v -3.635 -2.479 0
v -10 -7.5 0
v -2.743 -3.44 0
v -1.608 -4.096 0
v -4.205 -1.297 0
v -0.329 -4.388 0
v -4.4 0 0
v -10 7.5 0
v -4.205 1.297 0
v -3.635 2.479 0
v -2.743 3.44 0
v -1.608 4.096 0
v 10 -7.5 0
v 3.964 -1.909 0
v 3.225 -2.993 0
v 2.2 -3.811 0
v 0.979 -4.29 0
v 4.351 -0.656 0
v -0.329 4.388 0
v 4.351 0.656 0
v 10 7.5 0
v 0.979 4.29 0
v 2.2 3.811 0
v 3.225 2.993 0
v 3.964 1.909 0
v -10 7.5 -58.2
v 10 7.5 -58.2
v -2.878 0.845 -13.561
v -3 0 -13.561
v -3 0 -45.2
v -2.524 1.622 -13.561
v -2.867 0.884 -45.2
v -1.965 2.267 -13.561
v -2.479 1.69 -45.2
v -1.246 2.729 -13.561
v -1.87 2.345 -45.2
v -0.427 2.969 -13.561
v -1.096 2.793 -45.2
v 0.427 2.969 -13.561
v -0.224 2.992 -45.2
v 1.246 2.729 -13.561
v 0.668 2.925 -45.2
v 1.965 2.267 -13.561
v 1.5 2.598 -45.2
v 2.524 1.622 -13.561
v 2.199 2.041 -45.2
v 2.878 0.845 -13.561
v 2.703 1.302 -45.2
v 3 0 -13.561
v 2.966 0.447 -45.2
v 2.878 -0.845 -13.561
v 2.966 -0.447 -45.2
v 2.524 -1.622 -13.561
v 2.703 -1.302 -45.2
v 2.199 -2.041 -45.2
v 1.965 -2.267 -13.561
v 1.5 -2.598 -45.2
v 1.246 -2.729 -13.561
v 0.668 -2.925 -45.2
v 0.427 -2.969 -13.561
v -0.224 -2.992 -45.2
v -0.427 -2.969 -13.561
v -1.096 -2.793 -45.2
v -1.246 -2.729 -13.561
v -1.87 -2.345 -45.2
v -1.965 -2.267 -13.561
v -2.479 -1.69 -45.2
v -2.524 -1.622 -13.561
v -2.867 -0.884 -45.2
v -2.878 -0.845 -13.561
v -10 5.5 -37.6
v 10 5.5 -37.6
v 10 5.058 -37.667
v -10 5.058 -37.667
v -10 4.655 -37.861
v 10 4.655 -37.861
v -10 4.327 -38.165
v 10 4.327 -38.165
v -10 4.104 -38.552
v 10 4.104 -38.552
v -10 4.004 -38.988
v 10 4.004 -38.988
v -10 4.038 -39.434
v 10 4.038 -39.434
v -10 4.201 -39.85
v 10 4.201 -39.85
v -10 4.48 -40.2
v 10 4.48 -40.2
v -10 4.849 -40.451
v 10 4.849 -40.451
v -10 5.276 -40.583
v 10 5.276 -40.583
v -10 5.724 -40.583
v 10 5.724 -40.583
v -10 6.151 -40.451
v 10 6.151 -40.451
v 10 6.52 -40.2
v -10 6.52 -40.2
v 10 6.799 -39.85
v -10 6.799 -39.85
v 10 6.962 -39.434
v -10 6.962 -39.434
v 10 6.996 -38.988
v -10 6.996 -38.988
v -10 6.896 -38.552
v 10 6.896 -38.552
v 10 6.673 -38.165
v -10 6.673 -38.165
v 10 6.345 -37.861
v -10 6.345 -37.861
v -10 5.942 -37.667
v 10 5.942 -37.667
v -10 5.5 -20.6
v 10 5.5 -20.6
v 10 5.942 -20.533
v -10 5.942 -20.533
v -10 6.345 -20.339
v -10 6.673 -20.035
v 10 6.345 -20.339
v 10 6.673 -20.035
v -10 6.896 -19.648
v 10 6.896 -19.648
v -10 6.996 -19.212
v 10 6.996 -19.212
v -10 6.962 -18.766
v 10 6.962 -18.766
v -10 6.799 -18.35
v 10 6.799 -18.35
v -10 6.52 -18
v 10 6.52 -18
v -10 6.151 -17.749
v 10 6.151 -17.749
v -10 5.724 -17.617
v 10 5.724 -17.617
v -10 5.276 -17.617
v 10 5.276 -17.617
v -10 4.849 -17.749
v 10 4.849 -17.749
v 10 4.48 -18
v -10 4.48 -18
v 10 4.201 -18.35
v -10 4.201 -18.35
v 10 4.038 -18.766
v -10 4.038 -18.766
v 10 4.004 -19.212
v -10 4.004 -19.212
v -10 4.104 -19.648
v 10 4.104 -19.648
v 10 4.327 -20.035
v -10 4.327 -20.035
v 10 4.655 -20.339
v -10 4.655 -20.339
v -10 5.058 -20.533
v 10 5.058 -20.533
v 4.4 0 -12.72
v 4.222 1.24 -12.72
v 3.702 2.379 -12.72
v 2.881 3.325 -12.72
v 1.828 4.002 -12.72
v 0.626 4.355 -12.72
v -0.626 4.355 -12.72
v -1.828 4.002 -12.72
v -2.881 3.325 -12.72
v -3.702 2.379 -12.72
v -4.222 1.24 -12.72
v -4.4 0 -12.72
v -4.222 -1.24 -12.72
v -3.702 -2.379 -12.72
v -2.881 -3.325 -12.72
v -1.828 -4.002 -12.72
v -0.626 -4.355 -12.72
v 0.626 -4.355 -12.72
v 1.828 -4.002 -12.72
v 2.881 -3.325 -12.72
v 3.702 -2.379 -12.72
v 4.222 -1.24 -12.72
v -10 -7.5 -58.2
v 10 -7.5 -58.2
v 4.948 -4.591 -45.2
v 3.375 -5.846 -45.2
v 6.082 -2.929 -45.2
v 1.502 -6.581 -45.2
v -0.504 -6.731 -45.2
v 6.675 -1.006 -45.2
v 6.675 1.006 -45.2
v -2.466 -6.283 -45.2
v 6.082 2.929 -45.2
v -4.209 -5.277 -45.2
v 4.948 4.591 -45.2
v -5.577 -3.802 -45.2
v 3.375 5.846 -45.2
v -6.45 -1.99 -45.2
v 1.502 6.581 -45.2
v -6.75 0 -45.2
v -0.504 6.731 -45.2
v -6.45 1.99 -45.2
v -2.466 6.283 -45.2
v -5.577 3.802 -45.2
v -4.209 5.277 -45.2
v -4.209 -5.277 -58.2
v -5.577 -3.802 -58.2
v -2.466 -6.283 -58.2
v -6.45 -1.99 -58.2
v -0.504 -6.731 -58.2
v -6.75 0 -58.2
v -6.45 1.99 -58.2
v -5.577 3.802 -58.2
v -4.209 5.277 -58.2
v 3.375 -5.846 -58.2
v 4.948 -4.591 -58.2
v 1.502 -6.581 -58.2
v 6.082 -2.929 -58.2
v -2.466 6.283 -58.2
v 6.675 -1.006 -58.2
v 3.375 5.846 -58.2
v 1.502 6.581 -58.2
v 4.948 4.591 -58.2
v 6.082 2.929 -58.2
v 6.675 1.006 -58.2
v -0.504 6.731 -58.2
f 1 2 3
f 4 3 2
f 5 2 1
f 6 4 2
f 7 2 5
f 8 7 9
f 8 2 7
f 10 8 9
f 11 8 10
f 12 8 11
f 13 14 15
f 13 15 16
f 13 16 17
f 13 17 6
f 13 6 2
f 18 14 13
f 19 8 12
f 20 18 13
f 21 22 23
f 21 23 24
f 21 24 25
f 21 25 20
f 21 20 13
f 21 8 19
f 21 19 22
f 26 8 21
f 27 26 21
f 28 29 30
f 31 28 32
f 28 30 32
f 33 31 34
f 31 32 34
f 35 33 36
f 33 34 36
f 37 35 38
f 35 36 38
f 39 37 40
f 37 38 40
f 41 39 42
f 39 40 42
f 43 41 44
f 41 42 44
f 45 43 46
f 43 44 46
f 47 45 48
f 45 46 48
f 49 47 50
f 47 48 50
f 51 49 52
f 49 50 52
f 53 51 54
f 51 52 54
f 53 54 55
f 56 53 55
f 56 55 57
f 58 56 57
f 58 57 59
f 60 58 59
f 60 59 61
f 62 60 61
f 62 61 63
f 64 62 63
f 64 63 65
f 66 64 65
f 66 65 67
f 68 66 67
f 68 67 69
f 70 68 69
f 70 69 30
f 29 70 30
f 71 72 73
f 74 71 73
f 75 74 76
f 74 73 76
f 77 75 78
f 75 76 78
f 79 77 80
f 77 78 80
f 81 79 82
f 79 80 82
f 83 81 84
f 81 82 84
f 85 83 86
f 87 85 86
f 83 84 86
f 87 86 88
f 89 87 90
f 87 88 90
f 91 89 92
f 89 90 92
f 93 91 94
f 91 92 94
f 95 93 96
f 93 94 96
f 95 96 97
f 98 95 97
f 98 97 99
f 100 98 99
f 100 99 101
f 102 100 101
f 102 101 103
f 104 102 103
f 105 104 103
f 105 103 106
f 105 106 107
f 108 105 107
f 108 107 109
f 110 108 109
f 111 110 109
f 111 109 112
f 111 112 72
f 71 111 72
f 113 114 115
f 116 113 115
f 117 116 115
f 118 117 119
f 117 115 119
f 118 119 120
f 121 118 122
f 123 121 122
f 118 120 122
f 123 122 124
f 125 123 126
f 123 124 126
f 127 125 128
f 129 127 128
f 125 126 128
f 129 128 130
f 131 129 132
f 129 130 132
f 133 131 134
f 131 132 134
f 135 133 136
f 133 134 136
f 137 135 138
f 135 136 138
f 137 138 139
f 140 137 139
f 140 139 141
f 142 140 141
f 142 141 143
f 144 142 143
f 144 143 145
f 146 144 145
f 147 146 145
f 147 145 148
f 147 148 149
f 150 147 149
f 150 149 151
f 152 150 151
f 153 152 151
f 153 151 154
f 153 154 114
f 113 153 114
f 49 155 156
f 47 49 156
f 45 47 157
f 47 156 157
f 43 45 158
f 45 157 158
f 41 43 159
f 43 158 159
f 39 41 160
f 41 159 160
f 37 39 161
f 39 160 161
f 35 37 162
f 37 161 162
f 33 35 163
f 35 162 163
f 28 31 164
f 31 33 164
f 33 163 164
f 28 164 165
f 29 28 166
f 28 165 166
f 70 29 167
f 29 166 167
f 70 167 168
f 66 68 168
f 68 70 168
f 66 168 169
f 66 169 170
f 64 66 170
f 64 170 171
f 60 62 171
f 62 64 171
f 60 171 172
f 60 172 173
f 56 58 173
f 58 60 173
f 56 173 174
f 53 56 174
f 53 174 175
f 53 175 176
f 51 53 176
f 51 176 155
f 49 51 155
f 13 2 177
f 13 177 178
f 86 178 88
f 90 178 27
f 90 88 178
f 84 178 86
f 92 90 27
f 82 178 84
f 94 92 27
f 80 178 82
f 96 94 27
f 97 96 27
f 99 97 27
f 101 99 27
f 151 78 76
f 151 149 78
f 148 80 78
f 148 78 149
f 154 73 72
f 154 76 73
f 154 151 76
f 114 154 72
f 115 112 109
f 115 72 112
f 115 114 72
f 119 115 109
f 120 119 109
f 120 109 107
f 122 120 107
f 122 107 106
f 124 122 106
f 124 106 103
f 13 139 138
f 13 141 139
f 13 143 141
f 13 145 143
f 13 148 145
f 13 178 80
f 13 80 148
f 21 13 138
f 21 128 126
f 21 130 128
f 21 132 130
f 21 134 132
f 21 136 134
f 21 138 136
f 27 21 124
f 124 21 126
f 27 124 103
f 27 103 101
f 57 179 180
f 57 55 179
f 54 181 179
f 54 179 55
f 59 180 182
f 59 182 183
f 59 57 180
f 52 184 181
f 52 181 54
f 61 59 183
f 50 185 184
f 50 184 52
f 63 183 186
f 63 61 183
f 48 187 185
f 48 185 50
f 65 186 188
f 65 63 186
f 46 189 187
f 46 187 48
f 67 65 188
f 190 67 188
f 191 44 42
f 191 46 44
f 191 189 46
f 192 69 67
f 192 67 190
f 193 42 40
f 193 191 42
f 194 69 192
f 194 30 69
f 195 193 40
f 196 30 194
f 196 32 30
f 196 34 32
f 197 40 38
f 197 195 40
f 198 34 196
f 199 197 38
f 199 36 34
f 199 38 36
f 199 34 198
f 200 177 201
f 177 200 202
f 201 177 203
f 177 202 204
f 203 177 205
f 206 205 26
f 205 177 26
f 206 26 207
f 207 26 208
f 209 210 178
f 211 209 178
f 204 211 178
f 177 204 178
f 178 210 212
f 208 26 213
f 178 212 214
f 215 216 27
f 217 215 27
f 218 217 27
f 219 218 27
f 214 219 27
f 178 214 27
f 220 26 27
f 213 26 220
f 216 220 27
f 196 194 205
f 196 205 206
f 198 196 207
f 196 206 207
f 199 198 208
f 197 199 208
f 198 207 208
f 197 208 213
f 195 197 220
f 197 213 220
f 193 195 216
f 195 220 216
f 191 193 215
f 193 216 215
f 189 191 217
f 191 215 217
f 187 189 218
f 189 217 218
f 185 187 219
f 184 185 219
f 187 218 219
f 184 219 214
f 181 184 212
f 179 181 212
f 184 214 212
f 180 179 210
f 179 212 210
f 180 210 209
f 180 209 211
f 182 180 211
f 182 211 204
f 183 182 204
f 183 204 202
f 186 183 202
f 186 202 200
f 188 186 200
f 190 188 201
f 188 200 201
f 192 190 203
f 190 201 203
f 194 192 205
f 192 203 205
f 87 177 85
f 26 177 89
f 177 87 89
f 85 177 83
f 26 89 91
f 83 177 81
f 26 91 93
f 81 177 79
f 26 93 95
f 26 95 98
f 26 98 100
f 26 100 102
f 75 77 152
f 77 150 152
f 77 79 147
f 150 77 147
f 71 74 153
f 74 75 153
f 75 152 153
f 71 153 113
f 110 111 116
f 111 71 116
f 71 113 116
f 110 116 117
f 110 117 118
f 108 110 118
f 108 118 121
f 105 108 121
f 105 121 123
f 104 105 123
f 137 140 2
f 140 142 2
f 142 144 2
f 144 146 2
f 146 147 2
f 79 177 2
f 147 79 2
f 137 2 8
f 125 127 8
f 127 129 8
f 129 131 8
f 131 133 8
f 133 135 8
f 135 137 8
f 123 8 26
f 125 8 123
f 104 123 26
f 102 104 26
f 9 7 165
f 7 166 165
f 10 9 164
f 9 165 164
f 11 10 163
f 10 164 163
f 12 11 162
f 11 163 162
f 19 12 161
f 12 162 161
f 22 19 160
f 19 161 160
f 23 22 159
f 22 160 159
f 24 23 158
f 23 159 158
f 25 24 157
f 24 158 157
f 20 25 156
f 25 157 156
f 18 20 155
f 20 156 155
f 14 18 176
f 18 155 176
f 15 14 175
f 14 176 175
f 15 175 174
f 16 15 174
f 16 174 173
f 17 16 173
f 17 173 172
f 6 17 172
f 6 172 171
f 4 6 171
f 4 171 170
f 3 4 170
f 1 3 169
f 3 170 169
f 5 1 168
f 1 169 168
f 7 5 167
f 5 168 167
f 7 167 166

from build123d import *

# Parameters (mm, degrees)
SCHIZZO1_W                   = 20
SCHIZZO1_H                   = 15
ESTRUSIONE_ESTRUSIONE1_DEPTH = 58.2
SCHIZZO2_R                   = 3
TAGLIO_ESTRUSIONE1_DEPTH     = 60.527220664
SCHIZZO3_R                   = 6.75
TAGLIO_ESTRUSIONE2_DEPTH     = 13
SCHIZZO4_R                   = 1.5
TAGLIO_ESTRUSIONE3_DEPTH     = 62.99588696
FORO_FILETTATO_G1_8_1_D      = 8.8
FORO_FILETTATO_G1_8_1_DEPTH  = 12.72
FORO_FILETTATO_G1_8_1_TIP    = 2.643786724


with BuildPart() as part:
    # Schizzo1 → Estrusione-Estrusione1 (new body)
    with BuildSketch(Plane.XY):
        Rectangle(SCHIZZO1_W, SCHIZZO1_H)
    extrude(amount=-ESTRUSIONE_ESTRUSIONE1_DEPTH)

    # Schizzo2 → Taglio-Estrusione1 (cut, through all)
    with BuildSketch(Plane(origin=(0, 0, -58.2), x_dir=(-1, 0, 0), z_dir=(0, 0, -1))):
        Circle(SCHIZZO2_R)
    extrude(amount=-TAGLIO_ESTRUSIONE1_DEPTH, mode=Mode.SUBTRACT)

    # Schizzo3 → Taglio-Estrusione2 (cut)
    with BuildSketch(Plane(origin=(0, 0, -58.2), x_dir=(-1, 0, 0), z_dir=(0, 0, -1))):
        Circle(SCHIZZO3_R)
    extrude(amount=-TAGLIO_ESTRUSIONE2_DEPTH, mode=Mode.SUBTRACT)

    # Schizzo4 → Taglio-Estrusione3 (cut, through all)
    with BuildSketch(Plane(origin=(10, 0, 0), x_dir=(0, 0, -1), z_dir=(1, 0, 0))):
        with Locations((19.1, 5.5)):
            Circle(SCHIZZO4_R)
        with Locations(Location((39.1, 5.5, 0), (0, 0, 180))):
            Circle(SCHIZZO4_R)
    extrude(amount=-TAGLIO_ESTRUSIONE3_DEPTH, mode=Mode.SUBTRACT)

    # Foro filettato G1/8-1
    with Locations(Plane.XY):
        with Locations((0, 0)):
            Hole(FORO_FILETTATO_G1_8_1_D / 2, depth=FORO_FILETTATO_G1_8_1_DEPTH)
            with Locations((0, 0, -(FORO_FILETTATO_G1_8_1_DEPTH + FORO_FILETTATO_G1_8_1_TIP / 2))):  # 118° drill point
                Cone(0, FORO_FILETTATO_G1_8_1_D / 2, FORO_FILETTATO_G1_8_1_TIP, mode=Mode.SUBTRACT)


solid = part.part
